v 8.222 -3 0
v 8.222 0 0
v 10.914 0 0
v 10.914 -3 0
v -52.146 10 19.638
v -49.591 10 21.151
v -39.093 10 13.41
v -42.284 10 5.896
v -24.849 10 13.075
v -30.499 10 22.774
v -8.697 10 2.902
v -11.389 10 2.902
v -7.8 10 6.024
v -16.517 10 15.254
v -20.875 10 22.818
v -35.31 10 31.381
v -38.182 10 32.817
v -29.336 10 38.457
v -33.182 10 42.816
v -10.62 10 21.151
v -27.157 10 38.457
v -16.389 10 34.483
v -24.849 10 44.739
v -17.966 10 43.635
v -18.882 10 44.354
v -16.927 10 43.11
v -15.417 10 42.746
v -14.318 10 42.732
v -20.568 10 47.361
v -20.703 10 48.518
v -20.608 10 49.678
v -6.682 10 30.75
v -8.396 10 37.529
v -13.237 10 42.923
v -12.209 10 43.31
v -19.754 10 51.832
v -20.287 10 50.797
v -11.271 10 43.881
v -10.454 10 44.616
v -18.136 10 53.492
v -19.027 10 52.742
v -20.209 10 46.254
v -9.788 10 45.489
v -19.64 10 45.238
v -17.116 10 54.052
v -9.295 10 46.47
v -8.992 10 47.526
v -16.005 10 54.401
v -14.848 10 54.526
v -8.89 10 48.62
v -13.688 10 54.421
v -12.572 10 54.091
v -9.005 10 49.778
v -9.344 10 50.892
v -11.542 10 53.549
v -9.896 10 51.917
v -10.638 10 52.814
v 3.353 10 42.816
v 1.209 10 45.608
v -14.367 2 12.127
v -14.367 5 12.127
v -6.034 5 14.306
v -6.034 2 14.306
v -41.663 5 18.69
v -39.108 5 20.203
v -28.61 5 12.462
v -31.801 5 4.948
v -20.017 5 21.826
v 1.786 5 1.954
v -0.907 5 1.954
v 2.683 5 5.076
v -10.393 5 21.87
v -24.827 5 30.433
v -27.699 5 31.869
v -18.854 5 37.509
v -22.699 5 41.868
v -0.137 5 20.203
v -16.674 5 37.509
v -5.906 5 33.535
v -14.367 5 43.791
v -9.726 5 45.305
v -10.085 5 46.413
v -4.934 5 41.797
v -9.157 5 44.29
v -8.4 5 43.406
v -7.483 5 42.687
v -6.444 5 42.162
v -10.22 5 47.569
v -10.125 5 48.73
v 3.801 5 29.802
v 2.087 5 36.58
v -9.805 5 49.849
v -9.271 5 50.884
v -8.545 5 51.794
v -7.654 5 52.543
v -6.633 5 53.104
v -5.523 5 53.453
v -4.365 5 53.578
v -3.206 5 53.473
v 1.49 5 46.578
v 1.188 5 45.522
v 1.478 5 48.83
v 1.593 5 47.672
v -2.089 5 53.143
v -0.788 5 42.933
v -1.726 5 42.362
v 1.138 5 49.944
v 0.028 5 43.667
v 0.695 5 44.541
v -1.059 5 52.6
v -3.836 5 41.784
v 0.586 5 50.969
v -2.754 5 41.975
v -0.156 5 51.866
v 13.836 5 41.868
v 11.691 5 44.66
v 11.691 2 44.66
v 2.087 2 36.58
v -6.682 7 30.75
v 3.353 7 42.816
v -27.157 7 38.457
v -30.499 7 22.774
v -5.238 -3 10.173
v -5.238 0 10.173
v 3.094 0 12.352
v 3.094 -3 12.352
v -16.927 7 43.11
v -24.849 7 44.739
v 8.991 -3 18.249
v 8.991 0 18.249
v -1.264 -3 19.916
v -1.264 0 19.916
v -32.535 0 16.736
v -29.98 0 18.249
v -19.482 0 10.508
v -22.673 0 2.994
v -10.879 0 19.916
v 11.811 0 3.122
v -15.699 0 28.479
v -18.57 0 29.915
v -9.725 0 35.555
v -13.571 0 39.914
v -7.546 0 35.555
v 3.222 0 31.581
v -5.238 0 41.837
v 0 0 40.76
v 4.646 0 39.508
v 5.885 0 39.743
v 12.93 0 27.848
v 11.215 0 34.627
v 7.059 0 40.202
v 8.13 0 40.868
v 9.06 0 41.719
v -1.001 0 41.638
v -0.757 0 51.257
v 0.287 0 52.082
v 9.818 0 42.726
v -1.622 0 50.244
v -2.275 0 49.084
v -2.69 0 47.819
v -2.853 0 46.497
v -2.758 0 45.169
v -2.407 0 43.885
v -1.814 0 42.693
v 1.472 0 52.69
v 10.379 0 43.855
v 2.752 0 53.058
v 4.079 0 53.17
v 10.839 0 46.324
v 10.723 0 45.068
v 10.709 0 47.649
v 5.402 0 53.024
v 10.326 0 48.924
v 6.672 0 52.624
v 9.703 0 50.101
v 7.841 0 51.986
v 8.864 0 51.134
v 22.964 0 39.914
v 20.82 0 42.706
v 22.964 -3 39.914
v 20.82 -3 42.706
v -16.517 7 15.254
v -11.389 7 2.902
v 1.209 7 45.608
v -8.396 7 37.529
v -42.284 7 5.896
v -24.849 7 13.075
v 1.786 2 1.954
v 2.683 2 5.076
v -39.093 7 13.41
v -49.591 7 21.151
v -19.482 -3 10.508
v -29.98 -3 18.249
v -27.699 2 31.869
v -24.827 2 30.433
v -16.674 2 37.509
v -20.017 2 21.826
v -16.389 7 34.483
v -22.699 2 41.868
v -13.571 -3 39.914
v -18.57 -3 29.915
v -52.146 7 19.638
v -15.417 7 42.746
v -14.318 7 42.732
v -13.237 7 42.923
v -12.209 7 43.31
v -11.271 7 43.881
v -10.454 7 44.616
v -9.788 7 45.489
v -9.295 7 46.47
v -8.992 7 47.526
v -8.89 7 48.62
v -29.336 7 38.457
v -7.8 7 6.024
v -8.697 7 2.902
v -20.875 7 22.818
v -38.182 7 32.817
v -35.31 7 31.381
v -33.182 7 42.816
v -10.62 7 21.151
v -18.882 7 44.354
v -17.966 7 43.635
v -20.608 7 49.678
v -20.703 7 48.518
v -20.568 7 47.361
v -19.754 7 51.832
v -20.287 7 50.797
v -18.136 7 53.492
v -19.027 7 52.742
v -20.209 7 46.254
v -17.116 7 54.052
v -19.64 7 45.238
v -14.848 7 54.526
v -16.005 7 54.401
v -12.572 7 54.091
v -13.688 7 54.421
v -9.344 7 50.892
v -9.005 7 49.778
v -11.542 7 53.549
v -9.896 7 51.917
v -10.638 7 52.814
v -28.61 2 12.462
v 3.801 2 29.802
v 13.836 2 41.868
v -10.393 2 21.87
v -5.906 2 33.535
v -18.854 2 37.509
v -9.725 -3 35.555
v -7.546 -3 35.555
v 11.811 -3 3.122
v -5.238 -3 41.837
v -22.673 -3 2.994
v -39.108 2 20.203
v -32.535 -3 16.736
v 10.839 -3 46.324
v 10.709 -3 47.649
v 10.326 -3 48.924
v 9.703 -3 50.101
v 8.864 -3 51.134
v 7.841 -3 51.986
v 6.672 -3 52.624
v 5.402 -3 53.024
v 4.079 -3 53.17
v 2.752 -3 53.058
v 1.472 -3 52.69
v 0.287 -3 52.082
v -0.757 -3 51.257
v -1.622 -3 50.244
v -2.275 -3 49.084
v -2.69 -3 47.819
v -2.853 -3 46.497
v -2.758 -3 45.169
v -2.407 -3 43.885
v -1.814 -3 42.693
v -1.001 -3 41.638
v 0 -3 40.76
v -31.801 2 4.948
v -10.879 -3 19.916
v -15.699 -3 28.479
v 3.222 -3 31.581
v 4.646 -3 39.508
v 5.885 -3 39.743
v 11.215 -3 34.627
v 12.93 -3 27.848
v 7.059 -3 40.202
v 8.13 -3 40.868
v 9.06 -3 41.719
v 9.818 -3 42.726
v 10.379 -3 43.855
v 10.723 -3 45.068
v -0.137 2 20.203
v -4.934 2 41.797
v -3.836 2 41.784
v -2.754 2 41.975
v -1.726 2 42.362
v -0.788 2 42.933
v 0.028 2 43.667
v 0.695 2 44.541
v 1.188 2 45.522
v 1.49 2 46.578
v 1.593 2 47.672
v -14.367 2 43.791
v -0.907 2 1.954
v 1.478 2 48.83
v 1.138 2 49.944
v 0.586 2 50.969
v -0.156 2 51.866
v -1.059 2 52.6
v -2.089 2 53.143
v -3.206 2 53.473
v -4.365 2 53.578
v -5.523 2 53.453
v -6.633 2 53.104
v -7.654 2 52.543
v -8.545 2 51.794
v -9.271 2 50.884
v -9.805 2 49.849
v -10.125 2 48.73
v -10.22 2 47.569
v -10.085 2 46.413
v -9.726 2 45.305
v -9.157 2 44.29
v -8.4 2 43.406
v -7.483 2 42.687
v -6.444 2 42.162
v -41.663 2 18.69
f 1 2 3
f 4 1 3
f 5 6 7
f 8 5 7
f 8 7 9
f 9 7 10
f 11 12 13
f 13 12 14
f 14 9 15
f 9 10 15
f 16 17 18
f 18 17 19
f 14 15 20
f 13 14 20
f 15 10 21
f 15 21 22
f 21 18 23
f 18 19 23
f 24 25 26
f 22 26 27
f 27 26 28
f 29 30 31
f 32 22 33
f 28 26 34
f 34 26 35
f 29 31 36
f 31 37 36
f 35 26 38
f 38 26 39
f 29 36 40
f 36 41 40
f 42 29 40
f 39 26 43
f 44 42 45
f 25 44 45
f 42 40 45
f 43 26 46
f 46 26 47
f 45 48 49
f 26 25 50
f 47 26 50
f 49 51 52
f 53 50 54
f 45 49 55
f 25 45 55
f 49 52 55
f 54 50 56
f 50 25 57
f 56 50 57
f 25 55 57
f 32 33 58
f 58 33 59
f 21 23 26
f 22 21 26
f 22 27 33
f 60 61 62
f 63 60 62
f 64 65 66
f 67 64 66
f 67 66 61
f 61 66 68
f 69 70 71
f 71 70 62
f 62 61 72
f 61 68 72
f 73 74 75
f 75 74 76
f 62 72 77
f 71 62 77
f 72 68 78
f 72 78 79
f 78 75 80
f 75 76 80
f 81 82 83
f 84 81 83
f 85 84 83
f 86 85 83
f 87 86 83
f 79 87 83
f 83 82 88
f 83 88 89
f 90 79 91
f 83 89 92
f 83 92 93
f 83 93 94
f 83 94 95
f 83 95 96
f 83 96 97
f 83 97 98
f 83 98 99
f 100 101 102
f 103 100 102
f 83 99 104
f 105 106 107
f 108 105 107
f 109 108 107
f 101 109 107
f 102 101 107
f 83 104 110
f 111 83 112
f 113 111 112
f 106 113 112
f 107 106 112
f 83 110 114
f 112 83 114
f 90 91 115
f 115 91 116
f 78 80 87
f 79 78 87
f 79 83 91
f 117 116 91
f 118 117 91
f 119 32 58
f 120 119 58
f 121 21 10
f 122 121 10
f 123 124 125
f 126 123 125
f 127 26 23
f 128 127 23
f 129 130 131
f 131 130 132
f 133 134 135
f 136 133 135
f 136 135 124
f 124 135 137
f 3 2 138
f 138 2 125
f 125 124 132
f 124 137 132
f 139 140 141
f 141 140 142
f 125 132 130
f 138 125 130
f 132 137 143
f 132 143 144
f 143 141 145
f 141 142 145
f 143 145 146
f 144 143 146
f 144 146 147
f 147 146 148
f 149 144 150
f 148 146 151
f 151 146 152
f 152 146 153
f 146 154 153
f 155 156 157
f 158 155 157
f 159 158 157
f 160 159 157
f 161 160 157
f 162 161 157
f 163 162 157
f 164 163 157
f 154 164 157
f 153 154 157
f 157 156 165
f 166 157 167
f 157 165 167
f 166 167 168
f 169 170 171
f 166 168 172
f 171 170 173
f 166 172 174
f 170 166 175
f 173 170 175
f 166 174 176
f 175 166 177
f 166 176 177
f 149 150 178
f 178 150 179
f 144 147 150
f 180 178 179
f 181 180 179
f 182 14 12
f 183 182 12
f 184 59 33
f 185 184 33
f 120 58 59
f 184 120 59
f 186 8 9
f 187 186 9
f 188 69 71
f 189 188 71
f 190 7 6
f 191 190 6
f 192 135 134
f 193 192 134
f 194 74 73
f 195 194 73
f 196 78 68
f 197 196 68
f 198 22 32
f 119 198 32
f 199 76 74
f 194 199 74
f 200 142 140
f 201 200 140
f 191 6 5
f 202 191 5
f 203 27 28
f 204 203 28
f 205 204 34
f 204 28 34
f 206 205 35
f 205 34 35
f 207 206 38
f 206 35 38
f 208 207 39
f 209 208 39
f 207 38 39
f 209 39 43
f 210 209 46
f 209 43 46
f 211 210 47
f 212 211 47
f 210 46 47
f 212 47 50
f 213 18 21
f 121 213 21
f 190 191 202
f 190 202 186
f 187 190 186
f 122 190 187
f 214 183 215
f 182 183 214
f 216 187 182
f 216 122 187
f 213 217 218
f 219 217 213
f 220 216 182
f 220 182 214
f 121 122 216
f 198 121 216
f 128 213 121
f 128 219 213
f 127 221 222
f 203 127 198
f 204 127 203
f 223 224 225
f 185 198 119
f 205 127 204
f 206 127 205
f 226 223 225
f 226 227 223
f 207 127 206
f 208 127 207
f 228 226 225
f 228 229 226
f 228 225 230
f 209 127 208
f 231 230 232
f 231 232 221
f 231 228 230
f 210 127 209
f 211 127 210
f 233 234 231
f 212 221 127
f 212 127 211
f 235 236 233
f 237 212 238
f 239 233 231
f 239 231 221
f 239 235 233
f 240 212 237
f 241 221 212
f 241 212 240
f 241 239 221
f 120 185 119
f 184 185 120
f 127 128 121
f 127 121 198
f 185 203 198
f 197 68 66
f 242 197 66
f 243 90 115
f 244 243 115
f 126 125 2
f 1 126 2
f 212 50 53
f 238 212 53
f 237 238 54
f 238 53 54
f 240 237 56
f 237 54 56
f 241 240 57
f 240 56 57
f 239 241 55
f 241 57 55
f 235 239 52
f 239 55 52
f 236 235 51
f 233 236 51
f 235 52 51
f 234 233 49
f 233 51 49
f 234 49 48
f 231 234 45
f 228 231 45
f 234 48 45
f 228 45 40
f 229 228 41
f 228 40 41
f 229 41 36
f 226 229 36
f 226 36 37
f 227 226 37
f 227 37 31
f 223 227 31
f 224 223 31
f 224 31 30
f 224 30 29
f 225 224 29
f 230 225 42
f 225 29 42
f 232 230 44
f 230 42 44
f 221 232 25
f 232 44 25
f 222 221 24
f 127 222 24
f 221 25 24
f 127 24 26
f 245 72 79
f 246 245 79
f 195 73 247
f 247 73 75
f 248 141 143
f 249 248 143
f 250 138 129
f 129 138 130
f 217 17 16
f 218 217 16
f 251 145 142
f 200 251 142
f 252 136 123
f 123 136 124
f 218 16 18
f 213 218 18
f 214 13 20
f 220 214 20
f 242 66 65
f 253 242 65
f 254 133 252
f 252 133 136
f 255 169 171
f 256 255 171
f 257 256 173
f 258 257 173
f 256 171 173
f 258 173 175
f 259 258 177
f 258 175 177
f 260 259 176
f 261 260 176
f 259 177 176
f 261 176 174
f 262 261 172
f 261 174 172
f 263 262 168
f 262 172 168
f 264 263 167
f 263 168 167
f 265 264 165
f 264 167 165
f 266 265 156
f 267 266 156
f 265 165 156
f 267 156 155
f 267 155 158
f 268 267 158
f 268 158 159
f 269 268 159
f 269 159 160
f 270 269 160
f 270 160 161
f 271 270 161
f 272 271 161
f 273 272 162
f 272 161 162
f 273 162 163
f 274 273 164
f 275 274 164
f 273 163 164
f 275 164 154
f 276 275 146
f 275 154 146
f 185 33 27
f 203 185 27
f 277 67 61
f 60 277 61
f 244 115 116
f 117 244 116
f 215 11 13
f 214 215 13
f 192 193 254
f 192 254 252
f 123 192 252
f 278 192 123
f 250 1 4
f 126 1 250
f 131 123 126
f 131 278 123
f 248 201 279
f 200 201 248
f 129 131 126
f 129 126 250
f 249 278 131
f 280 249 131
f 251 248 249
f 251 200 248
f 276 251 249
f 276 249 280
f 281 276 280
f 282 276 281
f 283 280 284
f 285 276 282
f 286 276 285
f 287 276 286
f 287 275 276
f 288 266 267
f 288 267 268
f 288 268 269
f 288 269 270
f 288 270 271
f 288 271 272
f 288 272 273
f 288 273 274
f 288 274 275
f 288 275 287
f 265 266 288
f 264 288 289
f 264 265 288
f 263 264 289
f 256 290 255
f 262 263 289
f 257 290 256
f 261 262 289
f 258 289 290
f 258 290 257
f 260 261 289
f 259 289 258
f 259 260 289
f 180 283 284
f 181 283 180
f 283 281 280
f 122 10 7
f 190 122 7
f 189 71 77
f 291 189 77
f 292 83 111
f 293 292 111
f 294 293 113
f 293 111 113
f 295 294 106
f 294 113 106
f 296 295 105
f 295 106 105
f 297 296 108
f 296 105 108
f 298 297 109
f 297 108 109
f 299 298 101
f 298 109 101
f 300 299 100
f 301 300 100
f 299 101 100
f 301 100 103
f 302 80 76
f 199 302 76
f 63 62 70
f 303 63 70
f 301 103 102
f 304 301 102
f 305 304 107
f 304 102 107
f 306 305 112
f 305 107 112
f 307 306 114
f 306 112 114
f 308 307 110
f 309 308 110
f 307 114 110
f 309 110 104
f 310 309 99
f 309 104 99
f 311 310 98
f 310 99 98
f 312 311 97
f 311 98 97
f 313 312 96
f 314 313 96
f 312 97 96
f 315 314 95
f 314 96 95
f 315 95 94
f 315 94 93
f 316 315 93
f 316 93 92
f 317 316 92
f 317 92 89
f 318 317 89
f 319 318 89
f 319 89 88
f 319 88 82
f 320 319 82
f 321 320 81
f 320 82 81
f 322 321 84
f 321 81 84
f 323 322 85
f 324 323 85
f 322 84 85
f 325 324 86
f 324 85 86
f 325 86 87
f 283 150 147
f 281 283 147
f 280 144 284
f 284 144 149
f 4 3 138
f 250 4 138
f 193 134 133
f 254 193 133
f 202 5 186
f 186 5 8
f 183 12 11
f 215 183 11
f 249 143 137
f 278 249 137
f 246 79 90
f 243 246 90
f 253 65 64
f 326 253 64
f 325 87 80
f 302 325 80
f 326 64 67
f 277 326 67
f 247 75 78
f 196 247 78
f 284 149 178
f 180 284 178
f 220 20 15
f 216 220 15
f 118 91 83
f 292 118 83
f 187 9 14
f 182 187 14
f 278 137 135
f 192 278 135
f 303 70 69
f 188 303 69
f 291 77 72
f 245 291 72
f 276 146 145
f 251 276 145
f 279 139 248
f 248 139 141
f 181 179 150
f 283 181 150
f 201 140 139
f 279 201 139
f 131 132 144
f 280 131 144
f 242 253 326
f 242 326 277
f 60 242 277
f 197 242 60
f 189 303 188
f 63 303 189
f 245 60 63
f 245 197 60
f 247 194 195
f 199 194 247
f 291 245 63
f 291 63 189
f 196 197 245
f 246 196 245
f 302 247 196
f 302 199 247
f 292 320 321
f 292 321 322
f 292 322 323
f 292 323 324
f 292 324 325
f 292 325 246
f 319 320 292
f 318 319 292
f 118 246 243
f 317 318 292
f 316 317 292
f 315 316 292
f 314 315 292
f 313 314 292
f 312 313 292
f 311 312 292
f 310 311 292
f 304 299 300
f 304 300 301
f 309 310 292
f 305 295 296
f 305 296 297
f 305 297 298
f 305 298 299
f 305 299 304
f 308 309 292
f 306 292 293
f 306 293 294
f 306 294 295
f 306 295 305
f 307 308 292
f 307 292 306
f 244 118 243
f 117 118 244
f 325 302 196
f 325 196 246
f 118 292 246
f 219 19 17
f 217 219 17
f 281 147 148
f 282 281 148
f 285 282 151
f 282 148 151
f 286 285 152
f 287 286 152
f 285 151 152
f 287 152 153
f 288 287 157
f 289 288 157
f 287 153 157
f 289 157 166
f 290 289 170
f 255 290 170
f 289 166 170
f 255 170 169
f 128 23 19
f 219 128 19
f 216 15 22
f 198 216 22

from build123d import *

# Parameters (mm, degrees)
F1_DEPTH = 3
F4_DEPTH = 3
F7_DEPTH = 3


with BuildPart() as f1:
    # F0 (on Front) → F1 (new body)
    with BuildSketch(Plane.XZ):
        with BuildLine():
            ThreePointArc((4.646492, 39.507657), (9.059628, 41.719127), (10.838907, 46.32353))
            ThreePointArc((10.838907, 46.32353), (0.864901, 52.415197), (0, 40.760106))
            ThreePointArc((0, 40.760106), (2.209592, 39.712235), (4.646492, 39.507657))
        make_face()
        with BuildLine():
            ThreePointArc((4.646492, 39.507657), (2.209592, 39.712235), (0, 40.760106))
            Line((0, 40.760106), (-5.238281, 41.836761))
            Line((-5.238281, 41.836761), (-13.570856, 39.913855))
            Line((-13.570856, 39.913855), (-18.570401, 29.914767))
            Line((-18.570401, 29.914767), (-15.698868, 28.479))
            Line((-15.698868, 28.479), (-9.725053, 35.555281))
            Line((-9.725053, 35.555281), (-7.545763, 35.555281))
            Line((-7.545763, 35.555281), (-10.878794, 19.915678))
            Line((-10.878794, 19.915678), (-19.48179, 10.507985))
            Line((-19.48179, 10.507985), (-29.97962, 18.249162))
            Line((-29.97962, 18.249162), (-32.5348, 16.736071))
            Line((-32.5348, 16.736071), (-22.672592, 2.99414))
            Line((-22.672592, 2.99414), (-5.238281, 10.172973))
            Line((-5.238281, 10.172973), (3.094294, 12.352263))
            Line((3.094294, 12.352263), (8.222032, 0))
            Line((8.222032, 0), (10.914096, 0))
            Line((10.914096, 0), (11.81145, 3.122333))
            Line((11.81145, 3.122333), (8.991194, 18.249162))
            Line((8.991194, 18.249162), (-1.264283, 19.915678))
            Line((-1.264283, 19.915678), (3.222488, 31.581283))
            Line((3.222488, 31.581283), (12.929509, 27.847813))
            Line((12.929509, 27.847813), (22.964282, 39.913855))
            Line((22.964282, 39.913855), (20.819625, 42.7064))
            Line((20.819625, 42.7064), (11.215365, 34.626625))
            Line((11.215365, 34.626625), (4.646492, 39.507657))
        make_face()
    extrude(amount=F1_DEPTH)


with BuildPart() as f4:
    # F3 (on offset) → F4 (new body)
    with BuildSketch(Plane.XZ.offset(-5)):
        with BuildLine():
            ThreePointArc((-4.934159, 41.797417), (-5.701197, 41.929952), (-6.444148, 42.162198))
            Line((-6.444148, 42.162198), (-14.366848, 43.790598))
            Line((-14.366848, 43.790598), (-22.699423, 41.867692))
            Line((-22.699423, 41.867692), (-27.698968, 31.868603))
            Line((-27.698968, 31.868603), (-24.827435, 30.432837))
            Line((-24.827435, 30.432837), (-18.85362, 37.509117))
            Line((-18.85362, 37.509117), (-16.67433, 37.509117))
            Line((-16.67433, 37.509117), (-20.016684, 21.825765))
            Line((-20.016684, 21.825765), (-28.610357, 12.461822))
            Line((-28.610357, 12.461822), (-39.108187, 20.202998))
            Line((-39.108187, 20.202998), (-41.663366, 18.689908))
            Line((-41.663366, 18.689908), (-31.801159, 4.947976))
            Line((-31.801159, 4.947976), (-14.366848, 12.12681))
            Line((-14.366848, 12.12681), (-6.034272, 14.306099))
            Line((-6.034272, 14.306099), (-0.906534, 1.953837))
            Line((-0.906534, 1.953837), (1.785529, 1.953837))
            Line((1.785529, 1.953837), (2.682883, 5.07617))
            Line((2.682883, 5.07617), (-0.137373, 20.202998))
            Line((-0.137373, 20.202998), (-10.39285, 21.869514))
            Line((-10.39285, 21.869514), (-5.906079, 33.535119))
            Line((-5.906079, 33.535119), (3.800942, 29.80165))
            Line((3.800942, 29.80165), (13.835715, 41.867692))
            Line((13.835715, 41.867692), (11.691058, 44.660237))
            Line((11.691058, 44.660237), (2.086798, 36.580462))
            Line((2.086798, 36.580462), (-4.934159, 41.797417))
        make_face()
        with BuildLine():
            ThreePointArc((-4.934159, 41.797417), (-0.362744, 43.281094), (1.592578, 47.671521))
            ThreePointArc((1.592578, 47.671521), (-7.653931, 52.54342), (-6.444148, 42.162198))
            ThreePointArc((-6.444148, 42.162198), (-5.701197, 41.929952), (-4.934159, 41.797417))
        make_face()
    extrude(amount=F4_DEPTH)


with BuildPart() as f7:
    # F6 (on offset) → F7 (new body)
    with BuildSketch(Plane.XZ.offset(-10)):
        with BuildLine():
            ThreePointArc((-15.416711, 42.745578), (-10.845296, 44.229255), (-8.889974, 48.619683))
            ThreePointArc((-8.889974, 48.619683), (-18.136484, 53.491582), (-16.9267, 43.11036))
            ThreePointArc((-16.9267, 43.11036), (-16.18375, 42.878113), (-15.416711, 42.745578))
        make_face()
        with BuildLine():
            ThreePointArc((-15.416711, 42.745578), (-16.18375, 42.878113), (-16.9267, 43.11036))
            Line((-16.9267, 43.11036), (-24.8494, 44.738759))
            Line((-24.8494, 44.738759), (-33.181976, 42.815854))
            Line((-33.181976, 42.815854), (-38.18152, 32.816765))
            Line((-38.18152, 32.816765), (-35.309987, 31.380998))
            Line((-35.309987, 31.380998), (-29.336172, 38.457279))
            Line((-29.336172, 38.457279), (-27.156882, 38.457279))
            Line((-27.156882, 38.457279), (-30.499237, 22.773926))
            Line((-30.499237, 22.773926), (-39.092909, 13.409984))
            Line((-39.092909, 13.409984), (-49.590739, 21.15116))
            Line((-49.590739, 21.15116), (-52.145919, 19.638069))
            Line((-52.145919, 19.638069), (-42.283711, 5.896138))
            Line((-42.283711, 5.896138), (-24.8494, 13.074972))
            Line((-24.8494, 13.074972), (-16.516825, 15.254261))
            Line((-16.516825, 15.254261), (-11.389087, 2.901998))
            Line((-11.389087, 2.901998), (-8.697024, 2.901998))
            Line((-8.697024, 2.901998), (-7.799669, 6.024331))
            Line((-7.799669, 6.024331), (-10.619925, 21.15116))
            Line((-10.619925, 21.15116), (-20.875403, 22.817676))
            Line((-20.875403, 22.817676), (-16.388632, 34.483281))
            Line((-16.388632, 34.483281), (-6.68161, 30.749811))
            Line((-6.68161, 30.749811), (3.353163, 42.815854))
            Line((3.353163, 42.815854), (1.208506, 45.608398))
            Line((1.208506, 45.608398), (-8.395755, 37.528624))
            Line((-8.395755, 37.528624), (-15.416711, 42.745578))
        make_face()
    extrude(amount=F7_DEPTH)


solid = Compound([f1.part, f4.part, f7.part])
